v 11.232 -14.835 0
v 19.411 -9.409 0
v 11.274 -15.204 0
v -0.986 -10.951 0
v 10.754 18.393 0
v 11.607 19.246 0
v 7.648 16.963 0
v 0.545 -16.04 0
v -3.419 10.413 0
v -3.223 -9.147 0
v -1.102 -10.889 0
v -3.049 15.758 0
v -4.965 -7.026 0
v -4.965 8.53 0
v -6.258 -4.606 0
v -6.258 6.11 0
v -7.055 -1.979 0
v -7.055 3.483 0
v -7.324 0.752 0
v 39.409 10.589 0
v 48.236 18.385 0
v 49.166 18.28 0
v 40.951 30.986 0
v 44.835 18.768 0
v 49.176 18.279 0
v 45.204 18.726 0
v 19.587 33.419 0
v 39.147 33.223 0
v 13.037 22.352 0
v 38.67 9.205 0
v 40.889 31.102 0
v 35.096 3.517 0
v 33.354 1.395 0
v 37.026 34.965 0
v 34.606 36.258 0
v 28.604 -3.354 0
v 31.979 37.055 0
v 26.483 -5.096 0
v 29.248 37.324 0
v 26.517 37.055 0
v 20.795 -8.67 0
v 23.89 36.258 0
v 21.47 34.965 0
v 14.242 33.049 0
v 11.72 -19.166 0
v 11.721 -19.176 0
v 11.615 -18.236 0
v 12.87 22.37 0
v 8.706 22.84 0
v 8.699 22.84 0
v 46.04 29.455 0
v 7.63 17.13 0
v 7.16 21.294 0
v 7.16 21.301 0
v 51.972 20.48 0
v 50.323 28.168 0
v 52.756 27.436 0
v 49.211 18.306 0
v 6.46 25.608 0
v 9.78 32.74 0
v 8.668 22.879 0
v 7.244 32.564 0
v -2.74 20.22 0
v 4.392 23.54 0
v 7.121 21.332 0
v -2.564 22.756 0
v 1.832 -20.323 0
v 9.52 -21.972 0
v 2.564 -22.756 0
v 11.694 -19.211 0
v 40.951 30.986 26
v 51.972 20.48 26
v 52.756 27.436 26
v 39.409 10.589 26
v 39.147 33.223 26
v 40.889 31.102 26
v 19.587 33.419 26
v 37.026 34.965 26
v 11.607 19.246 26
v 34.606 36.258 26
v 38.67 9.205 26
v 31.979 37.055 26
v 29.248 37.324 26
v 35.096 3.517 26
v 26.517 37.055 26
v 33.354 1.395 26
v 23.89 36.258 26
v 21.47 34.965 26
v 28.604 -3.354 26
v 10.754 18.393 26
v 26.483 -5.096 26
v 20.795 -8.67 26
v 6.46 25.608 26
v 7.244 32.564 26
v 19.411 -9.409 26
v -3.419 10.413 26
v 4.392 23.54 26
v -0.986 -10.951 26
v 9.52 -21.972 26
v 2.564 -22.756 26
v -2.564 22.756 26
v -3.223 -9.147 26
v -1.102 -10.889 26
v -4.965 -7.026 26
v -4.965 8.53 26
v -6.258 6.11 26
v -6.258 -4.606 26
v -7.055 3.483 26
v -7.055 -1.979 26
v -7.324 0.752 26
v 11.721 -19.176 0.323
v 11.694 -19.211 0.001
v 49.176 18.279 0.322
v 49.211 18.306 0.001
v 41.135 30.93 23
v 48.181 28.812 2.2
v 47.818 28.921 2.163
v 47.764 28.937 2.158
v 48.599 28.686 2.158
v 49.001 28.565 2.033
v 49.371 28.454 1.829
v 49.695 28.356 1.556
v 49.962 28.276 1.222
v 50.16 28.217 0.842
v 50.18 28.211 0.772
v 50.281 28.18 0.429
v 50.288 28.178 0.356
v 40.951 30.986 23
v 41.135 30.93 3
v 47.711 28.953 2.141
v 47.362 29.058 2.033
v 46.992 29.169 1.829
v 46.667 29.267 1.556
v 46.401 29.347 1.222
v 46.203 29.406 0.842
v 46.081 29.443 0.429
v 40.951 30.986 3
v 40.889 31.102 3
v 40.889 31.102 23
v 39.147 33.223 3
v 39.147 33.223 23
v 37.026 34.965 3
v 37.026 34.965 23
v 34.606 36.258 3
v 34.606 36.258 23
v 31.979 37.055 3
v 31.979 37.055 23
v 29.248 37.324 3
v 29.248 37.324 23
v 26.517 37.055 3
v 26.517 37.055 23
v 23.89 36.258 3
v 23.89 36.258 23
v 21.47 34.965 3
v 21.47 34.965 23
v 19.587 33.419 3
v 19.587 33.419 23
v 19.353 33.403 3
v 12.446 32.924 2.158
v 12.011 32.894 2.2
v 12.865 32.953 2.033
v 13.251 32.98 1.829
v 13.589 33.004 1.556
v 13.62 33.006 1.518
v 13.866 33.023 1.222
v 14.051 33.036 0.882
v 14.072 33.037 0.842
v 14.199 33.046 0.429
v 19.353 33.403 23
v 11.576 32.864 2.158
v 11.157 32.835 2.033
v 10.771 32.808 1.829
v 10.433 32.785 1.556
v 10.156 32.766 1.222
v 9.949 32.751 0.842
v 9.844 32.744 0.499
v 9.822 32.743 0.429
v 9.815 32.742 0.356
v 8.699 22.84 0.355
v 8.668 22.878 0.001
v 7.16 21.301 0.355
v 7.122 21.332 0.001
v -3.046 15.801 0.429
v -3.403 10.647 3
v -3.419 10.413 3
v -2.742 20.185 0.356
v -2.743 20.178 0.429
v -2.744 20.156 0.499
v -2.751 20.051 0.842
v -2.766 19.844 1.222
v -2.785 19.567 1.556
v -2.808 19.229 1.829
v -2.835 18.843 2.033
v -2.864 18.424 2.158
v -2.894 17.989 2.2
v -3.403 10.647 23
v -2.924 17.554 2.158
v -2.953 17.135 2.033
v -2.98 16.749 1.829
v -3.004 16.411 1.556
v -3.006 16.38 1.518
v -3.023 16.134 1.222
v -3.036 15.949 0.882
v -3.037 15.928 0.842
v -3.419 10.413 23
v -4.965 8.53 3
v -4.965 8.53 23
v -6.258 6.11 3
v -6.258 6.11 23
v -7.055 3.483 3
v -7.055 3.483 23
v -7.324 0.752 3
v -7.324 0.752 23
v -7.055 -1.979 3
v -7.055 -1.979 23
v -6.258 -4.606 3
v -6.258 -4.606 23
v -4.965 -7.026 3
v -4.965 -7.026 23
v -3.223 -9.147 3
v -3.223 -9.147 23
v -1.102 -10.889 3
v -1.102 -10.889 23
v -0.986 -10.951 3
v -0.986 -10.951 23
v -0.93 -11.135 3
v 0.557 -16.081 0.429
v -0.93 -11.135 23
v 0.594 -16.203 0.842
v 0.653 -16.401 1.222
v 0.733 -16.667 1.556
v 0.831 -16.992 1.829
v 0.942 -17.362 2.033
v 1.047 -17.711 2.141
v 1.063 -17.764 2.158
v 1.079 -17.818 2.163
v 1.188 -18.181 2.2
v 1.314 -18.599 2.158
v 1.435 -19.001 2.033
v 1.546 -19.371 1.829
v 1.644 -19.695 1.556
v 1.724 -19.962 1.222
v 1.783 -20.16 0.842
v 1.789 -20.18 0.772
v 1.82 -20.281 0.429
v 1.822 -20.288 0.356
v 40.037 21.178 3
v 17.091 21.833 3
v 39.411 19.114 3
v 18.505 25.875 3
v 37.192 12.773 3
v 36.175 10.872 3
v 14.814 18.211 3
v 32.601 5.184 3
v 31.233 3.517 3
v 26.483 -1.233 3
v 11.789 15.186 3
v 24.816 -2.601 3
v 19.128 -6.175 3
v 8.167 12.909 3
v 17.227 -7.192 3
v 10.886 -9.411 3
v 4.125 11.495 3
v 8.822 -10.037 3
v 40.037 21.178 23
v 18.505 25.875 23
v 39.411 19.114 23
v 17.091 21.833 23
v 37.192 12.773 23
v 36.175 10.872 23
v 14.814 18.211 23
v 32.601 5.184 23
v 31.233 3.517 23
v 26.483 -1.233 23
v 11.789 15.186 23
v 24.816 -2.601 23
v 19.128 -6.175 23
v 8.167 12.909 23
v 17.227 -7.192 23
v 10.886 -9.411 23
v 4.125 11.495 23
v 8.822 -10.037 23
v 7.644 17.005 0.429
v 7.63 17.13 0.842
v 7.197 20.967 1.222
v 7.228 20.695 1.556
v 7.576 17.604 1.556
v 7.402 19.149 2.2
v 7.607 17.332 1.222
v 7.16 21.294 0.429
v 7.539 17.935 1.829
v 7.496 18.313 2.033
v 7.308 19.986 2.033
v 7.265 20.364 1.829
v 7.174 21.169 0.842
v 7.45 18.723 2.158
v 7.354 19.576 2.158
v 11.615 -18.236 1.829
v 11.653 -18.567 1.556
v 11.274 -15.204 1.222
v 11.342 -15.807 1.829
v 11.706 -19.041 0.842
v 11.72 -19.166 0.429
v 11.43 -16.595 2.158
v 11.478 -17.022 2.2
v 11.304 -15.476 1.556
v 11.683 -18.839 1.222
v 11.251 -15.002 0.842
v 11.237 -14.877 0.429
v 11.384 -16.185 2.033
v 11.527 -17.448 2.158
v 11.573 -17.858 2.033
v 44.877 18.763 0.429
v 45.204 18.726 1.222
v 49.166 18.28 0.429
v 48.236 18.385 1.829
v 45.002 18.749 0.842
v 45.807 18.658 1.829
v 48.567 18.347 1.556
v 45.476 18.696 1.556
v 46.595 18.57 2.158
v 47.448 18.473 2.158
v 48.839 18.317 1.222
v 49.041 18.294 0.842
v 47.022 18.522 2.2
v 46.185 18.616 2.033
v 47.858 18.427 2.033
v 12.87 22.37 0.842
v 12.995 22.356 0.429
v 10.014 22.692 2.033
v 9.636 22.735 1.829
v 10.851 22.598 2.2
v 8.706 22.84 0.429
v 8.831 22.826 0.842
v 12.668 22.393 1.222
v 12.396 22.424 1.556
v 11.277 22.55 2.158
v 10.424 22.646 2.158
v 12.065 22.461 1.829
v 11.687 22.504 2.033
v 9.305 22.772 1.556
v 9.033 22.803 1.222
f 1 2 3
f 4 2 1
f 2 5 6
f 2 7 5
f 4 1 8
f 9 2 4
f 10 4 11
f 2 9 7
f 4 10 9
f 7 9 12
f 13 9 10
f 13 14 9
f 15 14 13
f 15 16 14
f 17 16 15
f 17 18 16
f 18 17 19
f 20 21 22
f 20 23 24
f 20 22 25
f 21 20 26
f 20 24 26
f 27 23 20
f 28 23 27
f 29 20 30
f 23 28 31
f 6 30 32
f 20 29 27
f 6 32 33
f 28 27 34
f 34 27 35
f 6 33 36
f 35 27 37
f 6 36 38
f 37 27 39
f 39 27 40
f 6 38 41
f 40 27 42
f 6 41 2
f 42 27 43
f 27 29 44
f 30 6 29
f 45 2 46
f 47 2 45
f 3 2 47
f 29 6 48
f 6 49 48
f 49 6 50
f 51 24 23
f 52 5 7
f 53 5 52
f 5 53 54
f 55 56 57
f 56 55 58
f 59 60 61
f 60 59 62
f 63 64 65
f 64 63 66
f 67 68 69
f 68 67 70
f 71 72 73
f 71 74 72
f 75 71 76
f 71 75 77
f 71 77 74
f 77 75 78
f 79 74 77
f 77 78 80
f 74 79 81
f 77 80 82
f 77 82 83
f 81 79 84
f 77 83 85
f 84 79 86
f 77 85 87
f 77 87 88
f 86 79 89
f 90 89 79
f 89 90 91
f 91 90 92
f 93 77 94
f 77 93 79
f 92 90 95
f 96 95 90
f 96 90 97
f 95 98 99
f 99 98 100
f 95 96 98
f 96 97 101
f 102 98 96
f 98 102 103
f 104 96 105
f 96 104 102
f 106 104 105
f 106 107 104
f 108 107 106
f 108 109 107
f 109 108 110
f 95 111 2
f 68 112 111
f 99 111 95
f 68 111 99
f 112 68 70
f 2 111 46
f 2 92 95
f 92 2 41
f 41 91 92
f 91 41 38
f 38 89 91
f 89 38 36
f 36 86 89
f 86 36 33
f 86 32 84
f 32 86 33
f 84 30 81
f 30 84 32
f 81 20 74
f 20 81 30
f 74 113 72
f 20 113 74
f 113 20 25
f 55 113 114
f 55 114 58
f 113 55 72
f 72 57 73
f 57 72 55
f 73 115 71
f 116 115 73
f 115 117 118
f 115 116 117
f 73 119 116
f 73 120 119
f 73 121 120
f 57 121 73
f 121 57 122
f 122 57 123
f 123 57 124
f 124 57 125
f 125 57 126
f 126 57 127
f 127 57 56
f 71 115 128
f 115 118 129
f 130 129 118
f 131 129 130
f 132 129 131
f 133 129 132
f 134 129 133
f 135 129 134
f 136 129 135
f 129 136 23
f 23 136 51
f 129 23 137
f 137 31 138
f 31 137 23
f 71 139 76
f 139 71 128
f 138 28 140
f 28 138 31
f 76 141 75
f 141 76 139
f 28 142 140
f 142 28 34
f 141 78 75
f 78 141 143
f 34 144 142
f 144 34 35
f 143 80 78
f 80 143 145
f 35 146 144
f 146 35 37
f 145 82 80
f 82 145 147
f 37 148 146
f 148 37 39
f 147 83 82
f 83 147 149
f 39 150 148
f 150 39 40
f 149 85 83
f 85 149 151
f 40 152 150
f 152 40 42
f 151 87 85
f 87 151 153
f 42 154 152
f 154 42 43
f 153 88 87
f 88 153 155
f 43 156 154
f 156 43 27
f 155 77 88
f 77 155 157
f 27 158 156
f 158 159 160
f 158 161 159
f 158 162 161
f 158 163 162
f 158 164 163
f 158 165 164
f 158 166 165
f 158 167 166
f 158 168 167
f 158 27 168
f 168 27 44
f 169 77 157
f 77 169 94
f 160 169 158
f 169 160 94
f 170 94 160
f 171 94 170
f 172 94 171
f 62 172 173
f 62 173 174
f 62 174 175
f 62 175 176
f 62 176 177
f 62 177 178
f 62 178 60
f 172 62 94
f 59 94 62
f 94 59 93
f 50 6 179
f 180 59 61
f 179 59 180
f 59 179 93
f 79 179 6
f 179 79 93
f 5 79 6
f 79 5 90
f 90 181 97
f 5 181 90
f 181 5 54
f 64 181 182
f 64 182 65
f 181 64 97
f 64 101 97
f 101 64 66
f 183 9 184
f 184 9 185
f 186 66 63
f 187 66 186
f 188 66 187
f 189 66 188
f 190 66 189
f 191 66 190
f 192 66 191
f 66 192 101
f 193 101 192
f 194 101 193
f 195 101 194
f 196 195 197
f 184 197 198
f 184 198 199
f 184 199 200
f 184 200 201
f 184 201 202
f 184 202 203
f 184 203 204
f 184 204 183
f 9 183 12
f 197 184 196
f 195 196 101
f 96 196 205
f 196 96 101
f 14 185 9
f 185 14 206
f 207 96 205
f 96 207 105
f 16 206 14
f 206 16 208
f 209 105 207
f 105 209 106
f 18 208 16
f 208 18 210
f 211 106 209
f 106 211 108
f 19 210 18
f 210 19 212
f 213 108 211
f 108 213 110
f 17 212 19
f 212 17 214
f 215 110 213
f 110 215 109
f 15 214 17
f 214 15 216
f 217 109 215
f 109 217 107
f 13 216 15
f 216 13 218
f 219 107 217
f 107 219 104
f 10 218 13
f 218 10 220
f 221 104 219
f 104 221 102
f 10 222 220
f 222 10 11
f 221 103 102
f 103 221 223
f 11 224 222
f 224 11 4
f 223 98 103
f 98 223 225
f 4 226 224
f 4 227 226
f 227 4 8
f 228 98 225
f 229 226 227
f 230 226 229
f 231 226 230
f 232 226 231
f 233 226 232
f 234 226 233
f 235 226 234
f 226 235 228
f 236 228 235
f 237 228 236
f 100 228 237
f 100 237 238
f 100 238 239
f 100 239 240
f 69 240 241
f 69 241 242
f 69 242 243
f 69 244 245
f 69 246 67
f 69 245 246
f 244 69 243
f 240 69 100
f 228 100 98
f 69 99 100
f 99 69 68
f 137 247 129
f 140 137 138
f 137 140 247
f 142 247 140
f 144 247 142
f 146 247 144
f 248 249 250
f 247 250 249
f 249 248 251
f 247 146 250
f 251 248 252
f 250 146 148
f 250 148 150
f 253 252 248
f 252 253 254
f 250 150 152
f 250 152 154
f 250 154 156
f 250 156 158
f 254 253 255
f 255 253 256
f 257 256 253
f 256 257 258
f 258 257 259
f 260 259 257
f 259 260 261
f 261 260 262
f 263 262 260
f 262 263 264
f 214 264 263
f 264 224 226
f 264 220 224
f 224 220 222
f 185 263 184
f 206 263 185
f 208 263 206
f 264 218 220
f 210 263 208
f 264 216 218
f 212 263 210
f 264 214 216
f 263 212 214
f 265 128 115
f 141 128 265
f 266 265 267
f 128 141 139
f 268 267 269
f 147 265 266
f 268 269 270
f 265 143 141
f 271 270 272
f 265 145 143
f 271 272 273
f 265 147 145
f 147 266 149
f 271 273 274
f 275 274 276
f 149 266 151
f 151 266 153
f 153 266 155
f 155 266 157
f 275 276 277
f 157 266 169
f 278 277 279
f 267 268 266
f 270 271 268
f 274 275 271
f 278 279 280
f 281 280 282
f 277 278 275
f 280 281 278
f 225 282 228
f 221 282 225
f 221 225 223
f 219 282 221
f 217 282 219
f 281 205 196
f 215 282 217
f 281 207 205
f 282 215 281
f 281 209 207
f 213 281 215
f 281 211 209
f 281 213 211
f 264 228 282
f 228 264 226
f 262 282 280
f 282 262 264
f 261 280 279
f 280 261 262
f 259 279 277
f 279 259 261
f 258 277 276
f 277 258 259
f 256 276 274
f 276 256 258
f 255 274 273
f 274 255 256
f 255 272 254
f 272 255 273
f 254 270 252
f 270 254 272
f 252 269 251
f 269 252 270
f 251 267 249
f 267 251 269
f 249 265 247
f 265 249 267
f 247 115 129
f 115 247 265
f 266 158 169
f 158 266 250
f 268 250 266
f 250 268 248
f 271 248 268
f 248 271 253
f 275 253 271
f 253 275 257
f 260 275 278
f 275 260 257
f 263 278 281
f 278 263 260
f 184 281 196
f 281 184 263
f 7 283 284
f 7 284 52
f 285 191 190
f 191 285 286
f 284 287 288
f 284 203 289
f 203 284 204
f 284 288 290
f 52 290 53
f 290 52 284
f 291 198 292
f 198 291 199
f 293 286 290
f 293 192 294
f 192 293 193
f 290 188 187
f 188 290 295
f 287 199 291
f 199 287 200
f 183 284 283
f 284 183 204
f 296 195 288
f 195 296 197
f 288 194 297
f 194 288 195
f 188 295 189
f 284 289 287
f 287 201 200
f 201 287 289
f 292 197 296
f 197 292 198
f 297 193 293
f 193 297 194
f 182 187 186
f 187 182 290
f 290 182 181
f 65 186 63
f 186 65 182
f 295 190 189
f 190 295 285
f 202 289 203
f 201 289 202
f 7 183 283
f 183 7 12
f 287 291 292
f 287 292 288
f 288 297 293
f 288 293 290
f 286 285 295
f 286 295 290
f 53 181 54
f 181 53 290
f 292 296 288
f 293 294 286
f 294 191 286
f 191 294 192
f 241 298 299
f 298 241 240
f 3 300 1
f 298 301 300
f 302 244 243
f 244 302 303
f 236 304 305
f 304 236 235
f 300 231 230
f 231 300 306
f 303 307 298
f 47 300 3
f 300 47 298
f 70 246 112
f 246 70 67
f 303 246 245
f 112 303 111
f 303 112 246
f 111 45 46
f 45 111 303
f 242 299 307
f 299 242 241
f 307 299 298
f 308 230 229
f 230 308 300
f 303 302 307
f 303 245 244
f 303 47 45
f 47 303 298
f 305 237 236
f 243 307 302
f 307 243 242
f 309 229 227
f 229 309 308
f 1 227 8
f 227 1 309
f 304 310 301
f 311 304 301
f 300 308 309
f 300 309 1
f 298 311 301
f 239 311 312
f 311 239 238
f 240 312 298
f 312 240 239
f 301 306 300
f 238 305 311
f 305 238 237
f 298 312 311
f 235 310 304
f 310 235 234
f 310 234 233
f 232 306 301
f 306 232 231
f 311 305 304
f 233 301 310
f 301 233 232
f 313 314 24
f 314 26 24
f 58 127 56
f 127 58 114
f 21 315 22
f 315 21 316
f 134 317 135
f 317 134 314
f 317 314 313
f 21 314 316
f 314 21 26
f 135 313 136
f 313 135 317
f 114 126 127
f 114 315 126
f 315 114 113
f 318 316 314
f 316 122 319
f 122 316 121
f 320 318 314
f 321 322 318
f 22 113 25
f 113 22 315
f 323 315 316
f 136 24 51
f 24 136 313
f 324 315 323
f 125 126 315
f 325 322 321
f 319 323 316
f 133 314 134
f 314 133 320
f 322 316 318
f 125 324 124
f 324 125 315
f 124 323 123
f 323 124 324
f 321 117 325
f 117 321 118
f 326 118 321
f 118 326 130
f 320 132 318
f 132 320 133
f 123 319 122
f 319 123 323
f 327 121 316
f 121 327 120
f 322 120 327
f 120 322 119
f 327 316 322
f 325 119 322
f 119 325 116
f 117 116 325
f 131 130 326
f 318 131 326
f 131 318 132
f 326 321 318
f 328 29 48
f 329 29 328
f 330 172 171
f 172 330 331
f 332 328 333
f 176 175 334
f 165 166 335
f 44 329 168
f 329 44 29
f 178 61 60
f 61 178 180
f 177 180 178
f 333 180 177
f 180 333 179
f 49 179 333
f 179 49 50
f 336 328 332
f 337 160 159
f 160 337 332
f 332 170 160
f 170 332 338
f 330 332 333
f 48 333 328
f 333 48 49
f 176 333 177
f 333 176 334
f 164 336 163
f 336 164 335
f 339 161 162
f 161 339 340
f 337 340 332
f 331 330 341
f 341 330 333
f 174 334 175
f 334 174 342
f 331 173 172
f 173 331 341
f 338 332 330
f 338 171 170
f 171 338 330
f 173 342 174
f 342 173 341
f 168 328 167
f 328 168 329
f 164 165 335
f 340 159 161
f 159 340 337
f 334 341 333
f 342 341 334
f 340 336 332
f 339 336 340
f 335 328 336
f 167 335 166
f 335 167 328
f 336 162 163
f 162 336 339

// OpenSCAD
$fn = 32;

// ----------------------------------------------------------------------
// Air duct: 28 mm duct, 3 mm wall, 26 mm across
// ----------------------------------------------------------------------

// --- parameters (mm) ---
duct_r = 14;              // duct core radius
duct_d = 28;              // duct core diameter
wall = 3;                 // duct wall thickness
height = 26;              // duct width (extrusion height)
port_r = 22.9;            // port flange half width
port_d = 45.8;            // port flange width
port_t = 7;               // port flange thickness
bolt_d = 4.4;             // port bolt holes
bolt_offset = 18.2;       // bolt hole offset from the port axis

difference() {
  /* outer hull chain: tube with a flat flange plate at every port */
  linear_extrude(height = 26) {
    hull() {
      polygon([[2.564, -22.756], [-2.564, 22.756], [4.392, 23.54], [9.52, -21.972]]);
      translate([9.937, 1.12]) circle(r = 14);
    }
    hull() {
      translate([9.937, 1.12]) circle(r = 14);
      translate([6.676, 0.752]) circle(r = 14);
    }
    hull() {
      translate([6.676, 0.752]) circle(r = 14);
      translate([13.017, 2.971]) circle(r = 14);
    }
    hull() {
      translate([13.017, 2.971]) circle(r = 14);
      translate([18.705, 6.545]) circle(r = 14);
    }
    hull() {
      translate([18.705, 6.545]) circle(r = 14);
      translate([23.455, 11.295]) circle(r = 14);
    }
    hull() {
      translate([23.455, 11.295]) circle(r = 14);
      translate([27.029, 16.983]) circle(r = 14);
    }
    hull() {
      translate([27.029, 16.983]) circle(r = 14);
      translate([29.248, 23.324]) circle(r = 14);
    }
    hull() {
      translate([29.248, 23.324]) circle(r = 14);
      translate([28.88, 20.063]) circle(r = 14);
    }
    hull() {
      translate([28.88, 20.063]) circle(r = 14);
      polygon([[7.244, 32.564], [52.756, 27.436], [51.972, 20.48], [6.46, 25.608]]);
    }
  }
  /* air passage: the same chain inset by the wall, 5 mm proud of the ports */
  translate([0, 0, 3]) linear_extrude(height = 20) {
    hull() {
      translate([-4.969, -0.56]) circle(r = 11);
      translate([6.676, 0.752]) circle(r = 11);
    }
    hull() {
      translate([6.676, 0.752]) circle(r = 11);
      translate([13.017, 2.971]) circle(r = 11);
    }
    hull() {
      translate([13.017, 2.971]) circle(r = 11);
      translate([18.705, 6.545]) circle(r = 11);
    }
    hull() {
      translate([18.705, 6.545]) circle(r = 11);
      translate([23.455, 11.295]) circle(r = 11);
    }
    hull() {
      translate([23.455, 11.295]) circle(r = 11);
      translate([27.029, 16.983]) circle(r = 11);
    }
    hull() {
      translate([27.029, 16.983]) circle(r = 11);
      translate([29.248, 23.324]) circle(r = 11);
    }
    hull() {
      translate([29.248, 23.324]) circle(r = 11);
      translate([30.56, 34.969]) circle(r = 11);
    }
  }
  translate([0, 0]) rotate([0, 0, -83.57]) translate([-18.2, -2.5]) rotate([-90, 0, 0]) cylinder(h = 12, d = 4.4);
  translate([0, 0]) rotate([0, 0, -83.57]) translate([18.2, -2.5]) rotate([-90, 0, 0]) cylinder(h = 12, d = 4.4);
  translate([30, 30]) rotate([0, 0, 173.57]) translate([-18.2, -2.5]) rotate([-90, 0, 0]) cylinder(h = 12, d = 4.4);
  translate([30, 30]) rotate([0, 0, 173.57]) translate([18.2, -2.5]) rotate([-90, 0, 0]) cylinder(h = 12, d = 4.4);
}
